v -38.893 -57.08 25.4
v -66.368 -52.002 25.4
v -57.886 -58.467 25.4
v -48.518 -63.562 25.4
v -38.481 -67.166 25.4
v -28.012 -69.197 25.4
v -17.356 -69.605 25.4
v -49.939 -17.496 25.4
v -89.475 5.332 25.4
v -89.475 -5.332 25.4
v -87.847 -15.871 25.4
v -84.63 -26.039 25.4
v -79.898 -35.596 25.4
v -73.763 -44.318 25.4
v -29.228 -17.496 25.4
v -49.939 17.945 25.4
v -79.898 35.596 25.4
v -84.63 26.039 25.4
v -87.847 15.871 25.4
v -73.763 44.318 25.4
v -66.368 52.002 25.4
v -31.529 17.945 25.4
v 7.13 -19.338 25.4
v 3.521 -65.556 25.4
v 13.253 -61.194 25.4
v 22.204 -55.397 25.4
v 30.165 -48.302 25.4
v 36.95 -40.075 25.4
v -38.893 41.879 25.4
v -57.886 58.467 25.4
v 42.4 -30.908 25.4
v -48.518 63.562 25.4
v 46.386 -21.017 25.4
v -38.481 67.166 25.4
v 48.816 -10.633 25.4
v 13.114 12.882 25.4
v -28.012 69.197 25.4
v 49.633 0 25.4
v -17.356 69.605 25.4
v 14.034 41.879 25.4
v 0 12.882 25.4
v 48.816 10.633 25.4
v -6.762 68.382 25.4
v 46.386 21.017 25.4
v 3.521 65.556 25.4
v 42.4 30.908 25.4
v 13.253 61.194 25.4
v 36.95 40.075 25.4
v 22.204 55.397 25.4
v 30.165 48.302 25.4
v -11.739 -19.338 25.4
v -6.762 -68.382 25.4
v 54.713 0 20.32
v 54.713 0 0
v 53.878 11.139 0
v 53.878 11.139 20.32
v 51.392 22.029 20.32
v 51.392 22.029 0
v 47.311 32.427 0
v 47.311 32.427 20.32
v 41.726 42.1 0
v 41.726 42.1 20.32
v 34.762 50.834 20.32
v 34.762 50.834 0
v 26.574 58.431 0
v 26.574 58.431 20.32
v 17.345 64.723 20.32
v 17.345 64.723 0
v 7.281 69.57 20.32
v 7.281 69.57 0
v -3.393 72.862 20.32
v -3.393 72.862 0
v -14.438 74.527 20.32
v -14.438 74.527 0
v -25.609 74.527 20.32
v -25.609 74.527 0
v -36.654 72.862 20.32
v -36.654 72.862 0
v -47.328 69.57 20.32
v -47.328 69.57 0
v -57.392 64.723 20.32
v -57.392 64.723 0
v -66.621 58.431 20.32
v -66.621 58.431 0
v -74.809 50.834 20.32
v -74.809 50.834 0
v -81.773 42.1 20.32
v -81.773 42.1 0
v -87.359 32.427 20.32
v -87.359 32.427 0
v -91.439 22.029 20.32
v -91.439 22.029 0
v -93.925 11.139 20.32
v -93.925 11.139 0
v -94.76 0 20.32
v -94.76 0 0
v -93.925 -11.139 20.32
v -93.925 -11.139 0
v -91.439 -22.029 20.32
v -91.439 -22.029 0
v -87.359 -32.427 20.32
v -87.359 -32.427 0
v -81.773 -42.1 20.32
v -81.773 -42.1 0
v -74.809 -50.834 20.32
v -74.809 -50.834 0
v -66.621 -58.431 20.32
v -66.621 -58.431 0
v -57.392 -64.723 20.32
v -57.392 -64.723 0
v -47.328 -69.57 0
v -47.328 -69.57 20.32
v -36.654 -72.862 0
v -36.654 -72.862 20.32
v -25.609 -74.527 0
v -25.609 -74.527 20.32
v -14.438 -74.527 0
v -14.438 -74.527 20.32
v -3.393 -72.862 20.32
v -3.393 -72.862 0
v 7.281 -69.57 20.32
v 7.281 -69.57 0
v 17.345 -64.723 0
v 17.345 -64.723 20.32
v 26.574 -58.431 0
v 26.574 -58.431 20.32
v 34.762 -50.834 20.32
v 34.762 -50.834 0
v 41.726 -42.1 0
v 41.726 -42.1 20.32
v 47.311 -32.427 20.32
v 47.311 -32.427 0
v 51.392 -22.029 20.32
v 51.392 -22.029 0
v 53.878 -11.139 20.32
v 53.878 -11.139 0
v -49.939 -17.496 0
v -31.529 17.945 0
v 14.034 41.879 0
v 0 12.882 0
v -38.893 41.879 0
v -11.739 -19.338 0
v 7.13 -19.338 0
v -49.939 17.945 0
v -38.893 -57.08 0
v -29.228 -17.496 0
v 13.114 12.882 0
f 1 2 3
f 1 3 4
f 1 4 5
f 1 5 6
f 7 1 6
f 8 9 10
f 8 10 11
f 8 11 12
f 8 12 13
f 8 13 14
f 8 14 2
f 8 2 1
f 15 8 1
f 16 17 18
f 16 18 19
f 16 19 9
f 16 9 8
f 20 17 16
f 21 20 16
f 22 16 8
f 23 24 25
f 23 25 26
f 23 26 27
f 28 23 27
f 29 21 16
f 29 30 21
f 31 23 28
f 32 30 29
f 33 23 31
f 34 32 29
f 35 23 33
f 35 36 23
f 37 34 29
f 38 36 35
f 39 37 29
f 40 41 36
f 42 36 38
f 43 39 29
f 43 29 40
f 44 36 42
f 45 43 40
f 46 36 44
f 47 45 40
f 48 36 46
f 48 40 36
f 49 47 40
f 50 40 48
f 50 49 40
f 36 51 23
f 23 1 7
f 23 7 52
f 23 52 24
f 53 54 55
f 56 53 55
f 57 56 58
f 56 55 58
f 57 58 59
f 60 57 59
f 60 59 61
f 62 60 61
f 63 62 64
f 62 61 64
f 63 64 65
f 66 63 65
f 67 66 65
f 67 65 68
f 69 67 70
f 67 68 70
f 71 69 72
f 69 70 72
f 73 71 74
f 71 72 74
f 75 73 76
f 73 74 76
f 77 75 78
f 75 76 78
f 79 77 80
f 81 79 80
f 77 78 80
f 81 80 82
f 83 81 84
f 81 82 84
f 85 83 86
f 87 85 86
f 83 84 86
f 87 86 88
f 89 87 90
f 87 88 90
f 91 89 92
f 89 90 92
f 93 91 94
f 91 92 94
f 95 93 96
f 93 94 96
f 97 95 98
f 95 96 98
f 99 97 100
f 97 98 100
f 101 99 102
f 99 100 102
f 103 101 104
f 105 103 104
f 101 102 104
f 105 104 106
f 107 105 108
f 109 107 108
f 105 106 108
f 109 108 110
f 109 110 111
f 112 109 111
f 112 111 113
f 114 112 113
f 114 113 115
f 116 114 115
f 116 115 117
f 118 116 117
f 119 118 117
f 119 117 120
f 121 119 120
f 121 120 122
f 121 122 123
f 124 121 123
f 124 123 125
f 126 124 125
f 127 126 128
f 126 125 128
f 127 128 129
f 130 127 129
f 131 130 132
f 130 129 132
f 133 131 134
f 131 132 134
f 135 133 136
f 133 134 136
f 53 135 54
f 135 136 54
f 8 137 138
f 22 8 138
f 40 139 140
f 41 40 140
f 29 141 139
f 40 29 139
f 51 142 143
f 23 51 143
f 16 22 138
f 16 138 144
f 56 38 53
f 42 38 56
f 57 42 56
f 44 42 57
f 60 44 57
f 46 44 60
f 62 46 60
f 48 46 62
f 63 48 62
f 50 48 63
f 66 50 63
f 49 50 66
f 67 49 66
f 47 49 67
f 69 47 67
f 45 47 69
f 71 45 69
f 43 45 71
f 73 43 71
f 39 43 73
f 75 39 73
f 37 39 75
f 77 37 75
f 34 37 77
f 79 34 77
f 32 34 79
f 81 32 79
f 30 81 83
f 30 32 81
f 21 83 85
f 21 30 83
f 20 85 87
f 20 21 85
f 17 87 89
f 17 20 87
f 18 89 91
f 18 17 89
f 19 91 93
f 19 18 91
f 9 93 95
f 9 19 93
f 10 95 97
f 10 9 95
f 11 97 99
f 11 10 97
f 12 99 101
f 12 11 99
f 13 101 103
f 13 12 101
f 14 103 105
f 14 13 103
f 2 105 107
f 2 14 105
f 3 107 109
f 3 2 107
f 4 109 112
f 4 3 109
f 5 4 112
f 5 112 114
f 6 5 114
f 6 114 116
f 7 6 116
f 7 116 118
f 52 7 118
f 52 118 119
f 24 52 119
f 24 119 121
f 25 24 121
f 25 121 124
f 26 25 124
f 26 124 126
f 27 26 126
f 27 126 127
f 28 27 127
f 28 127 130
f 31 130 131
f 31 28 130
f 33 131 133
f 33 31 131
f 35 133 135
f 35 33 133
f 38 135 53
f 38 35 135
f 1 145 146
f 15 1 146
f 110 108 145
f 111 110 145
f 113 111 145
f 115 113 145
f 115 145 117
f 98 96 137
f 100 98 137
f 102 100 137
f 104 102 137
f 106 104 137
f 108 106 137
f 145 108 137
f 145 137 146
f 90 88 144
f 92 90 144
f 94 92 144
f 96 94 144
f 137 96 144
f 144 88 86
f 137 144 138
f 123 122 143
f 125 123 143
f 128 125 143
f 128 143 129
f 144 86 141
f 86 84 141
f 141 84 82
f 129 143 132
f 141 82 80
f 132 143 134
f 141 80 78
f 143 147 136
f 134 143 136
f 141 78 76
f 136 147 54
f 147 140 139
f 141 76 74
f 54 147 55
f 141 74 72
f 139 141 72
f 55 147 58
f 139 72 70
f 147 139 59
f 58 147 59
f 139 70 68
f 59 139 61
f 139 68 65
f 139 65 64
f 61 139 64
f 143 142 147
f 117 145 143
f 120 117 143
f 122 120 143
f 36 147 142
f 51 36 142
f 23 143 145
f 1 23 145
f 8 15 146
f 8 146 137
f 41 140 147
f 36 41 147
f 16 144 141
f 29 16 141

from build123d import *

# Parameters (mm, degrees)
F0_R     = 74.736194
F1_DEPTH = 25.4
F2_SIZE  = 5.08


with BuildPart() as f1:
    # F0 (on Top) → F1 (new body)
    with BuildSketch(Plane.XY):
        with Locations((-20.023532, 0)):
            Circle(F0_R)
        Polygon((-49.93894, 17.944667), (-38.893249, 41.878957), (14.034008, 41.878957), (0, 12.881645), (13.113534, 12.881645), (-11.739265, -19.337591), (7.130454, -19.337591), (-38.893249, -57.080124), (-29.228272, -17.496489), (-49.93894, -17.496489), (-31.529456, 17.944667), align=None, mode=Mode.SUBTRACT)
    extrude(amount=F1_DEPTH)

    # F2
    f2_edges = [f1.edges().sort_by_distance(p)[0] for p in [
        (-94.759726, 0, 25.4),
    ]]
    chamfer(f2_edges, length=F2_SIZE)


solid = f1.part
